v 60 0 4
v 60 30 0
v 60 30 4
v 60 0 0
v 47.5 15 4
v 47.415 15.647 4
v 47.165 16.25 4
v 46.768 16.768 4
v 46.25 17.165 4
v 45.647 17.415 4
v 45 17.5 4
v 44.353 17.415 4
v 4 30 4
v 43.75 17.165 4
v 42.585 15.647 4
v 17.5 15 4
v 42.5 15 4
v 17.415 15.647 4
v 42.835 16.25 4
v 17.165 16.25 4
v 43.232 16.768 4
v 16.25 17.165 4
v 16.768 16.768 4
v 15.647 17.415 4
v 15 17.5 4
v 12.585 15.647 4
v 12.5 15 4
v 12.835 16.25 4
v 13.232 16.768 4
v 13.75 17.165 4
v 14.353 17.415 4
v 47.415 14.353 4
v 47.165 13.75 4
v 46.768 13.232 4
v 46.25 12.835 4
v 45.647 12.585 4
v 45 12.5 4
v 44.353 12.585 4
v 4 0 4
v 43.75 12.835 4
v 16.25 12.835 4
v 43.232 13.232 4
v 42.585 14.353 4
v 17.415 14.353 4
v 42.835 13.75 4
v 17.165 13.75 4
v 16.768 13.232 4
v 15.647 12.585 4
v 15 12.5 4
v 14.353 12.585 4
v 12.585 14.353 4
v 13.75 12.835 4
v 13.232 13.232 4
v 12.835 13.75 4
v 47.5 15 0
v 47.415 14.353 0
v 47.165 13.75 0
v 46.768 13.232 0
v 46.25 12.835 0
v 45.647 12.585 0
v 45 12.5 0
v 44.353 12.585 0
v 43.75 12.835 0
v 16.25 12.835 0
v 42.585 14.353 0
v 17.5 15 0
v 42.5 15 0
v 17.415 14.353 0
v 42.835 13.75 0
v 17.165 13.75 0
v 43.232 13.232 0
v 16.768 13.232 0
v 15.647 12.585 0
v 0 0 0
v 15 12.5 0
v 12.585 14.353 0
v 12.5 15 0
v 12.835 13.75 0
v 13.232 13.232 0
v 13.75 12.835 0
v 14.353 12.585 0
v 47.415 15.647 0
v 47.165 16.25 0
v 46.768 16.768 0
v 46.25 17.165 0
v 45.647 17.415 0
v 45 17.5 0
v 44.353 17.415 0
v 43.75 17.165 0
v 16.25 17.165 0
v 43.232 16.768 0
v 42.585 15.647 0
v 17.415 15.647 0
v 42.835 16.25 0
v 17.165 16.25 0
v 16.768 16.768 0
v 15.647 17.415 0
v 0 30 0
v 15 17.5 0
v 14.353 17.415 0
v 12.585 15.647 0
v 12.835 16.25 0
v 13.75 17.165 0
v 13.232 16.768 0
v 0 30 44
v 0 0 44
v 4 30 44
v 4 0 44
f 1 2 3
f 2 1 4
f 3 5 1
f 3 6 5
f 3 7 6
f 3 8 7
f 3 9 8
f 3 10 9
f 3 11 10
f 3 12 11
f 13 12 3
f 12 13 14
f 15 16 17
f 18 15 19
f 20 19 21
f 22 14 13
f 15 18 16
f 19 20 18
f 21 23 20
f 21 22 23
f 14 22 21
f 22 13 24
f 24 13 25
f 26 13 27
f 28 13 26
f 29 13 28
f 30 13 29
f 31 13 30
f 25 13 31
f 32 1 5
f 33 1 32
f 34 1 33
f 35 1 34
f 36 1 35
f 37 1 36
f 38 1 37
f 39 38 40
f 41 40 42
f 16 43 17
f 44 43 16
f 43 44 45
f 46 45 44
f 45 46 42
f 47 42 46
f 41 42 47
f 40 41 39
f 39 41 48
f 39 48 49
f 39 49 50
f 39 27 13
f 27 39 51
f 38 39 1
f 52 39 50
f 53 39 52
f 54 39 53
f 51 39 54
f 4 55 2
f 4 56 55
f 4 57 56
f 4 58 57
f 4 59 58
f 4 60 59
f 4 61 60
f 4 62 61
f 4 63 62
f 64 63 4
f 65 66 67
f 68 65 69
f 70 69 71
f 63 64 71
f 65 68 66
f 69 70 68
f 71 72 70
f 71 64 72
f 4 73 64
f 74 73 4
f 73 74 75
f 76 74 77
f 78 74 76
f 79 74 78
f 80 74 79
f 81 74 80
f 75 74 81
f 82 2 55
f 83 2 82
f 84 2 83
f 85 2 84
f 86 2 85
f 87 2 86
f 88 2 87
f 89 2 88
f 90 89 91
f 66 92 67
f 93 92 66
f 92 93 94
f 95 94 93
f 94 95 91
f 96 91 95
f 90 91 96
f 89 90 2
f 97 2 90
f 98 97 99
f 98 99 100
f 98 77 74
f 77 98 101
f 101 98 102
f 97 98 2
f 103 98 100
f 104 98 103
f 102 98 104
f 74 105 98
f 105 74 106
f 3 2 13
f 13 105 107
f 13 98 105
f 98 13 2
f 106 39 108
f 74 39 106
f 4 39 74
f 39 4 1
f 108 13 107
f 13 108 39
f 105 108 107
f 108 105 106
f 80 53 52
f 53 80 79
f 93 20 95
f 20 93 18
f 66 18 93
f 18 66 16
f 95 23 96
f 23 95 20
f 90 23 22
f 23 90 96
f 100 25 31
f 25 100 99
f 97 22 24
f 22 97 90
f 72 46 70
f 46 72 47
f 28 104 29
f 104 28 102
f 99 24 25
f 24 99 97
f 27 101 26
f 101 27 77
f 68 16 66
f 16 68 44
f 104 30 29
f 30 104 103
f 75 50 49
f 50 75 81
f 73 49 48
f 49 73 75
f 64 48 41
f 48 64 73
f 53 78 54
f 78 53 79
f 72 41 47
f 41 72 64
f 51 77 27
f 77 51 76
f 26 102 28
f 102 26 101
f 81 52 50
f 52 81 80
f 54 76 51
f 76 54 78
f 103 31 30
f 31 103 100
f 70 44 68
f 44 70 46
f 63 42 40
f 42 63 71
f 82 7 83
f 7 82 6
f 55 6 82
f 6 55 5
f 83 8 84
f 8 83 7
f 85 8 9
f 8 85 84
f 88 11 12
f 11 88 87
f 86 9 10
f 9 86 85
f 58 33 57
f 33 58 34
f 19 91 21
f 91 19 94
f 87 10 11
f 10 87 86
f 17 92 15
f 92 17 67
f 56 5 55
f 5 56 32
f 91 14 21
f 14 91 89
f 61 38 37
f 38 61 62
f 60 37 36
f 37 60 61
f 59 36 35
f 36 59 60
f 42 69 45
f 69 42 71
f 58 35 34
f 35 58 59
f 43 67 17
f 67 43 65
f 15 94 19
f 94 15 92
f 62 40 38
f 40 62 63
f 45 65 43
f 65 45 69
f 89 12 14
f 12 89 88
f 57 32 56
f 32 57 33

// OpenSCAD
// Parametric L-Bracket (OpenSCAD)
// Parameters: L=60 (length), W=30 (width), T=4 (thickness),
//   H1=40 (vertical arm height), H2=40 (reserved), D=5 (hole diameter),
//   N=2 (number of holes), R=3 (fillet radius). All dimensions in mm.

$fn = 32;

L  = 60;
W  = 30;
T  = 4;
H1 = 40;
H2 = 40;
D  = 5;
N  = 2;
R  = 3;

// Two rectangular plates forming an L shape
module bracket_body() {
    union() {
        // Horizontal arm (bottom plate)
        cube([L, W, T]);
        // Vertical arm (back plate)
        translate([0, 0, T])
            cube([T, W, H1]);
    }
}

// N holes through the horizontal plate, evenly distributed along X
module holes() {
    for (i = [0:N-1]) {
        x_pos = (i + 0.5) * L / N;
        translate([x_pos, W/2, -1])
            cylinder(d=D, h=T+2, $fn=24);
    }
}

difference() {
    bracket_body();
    holes();
}
